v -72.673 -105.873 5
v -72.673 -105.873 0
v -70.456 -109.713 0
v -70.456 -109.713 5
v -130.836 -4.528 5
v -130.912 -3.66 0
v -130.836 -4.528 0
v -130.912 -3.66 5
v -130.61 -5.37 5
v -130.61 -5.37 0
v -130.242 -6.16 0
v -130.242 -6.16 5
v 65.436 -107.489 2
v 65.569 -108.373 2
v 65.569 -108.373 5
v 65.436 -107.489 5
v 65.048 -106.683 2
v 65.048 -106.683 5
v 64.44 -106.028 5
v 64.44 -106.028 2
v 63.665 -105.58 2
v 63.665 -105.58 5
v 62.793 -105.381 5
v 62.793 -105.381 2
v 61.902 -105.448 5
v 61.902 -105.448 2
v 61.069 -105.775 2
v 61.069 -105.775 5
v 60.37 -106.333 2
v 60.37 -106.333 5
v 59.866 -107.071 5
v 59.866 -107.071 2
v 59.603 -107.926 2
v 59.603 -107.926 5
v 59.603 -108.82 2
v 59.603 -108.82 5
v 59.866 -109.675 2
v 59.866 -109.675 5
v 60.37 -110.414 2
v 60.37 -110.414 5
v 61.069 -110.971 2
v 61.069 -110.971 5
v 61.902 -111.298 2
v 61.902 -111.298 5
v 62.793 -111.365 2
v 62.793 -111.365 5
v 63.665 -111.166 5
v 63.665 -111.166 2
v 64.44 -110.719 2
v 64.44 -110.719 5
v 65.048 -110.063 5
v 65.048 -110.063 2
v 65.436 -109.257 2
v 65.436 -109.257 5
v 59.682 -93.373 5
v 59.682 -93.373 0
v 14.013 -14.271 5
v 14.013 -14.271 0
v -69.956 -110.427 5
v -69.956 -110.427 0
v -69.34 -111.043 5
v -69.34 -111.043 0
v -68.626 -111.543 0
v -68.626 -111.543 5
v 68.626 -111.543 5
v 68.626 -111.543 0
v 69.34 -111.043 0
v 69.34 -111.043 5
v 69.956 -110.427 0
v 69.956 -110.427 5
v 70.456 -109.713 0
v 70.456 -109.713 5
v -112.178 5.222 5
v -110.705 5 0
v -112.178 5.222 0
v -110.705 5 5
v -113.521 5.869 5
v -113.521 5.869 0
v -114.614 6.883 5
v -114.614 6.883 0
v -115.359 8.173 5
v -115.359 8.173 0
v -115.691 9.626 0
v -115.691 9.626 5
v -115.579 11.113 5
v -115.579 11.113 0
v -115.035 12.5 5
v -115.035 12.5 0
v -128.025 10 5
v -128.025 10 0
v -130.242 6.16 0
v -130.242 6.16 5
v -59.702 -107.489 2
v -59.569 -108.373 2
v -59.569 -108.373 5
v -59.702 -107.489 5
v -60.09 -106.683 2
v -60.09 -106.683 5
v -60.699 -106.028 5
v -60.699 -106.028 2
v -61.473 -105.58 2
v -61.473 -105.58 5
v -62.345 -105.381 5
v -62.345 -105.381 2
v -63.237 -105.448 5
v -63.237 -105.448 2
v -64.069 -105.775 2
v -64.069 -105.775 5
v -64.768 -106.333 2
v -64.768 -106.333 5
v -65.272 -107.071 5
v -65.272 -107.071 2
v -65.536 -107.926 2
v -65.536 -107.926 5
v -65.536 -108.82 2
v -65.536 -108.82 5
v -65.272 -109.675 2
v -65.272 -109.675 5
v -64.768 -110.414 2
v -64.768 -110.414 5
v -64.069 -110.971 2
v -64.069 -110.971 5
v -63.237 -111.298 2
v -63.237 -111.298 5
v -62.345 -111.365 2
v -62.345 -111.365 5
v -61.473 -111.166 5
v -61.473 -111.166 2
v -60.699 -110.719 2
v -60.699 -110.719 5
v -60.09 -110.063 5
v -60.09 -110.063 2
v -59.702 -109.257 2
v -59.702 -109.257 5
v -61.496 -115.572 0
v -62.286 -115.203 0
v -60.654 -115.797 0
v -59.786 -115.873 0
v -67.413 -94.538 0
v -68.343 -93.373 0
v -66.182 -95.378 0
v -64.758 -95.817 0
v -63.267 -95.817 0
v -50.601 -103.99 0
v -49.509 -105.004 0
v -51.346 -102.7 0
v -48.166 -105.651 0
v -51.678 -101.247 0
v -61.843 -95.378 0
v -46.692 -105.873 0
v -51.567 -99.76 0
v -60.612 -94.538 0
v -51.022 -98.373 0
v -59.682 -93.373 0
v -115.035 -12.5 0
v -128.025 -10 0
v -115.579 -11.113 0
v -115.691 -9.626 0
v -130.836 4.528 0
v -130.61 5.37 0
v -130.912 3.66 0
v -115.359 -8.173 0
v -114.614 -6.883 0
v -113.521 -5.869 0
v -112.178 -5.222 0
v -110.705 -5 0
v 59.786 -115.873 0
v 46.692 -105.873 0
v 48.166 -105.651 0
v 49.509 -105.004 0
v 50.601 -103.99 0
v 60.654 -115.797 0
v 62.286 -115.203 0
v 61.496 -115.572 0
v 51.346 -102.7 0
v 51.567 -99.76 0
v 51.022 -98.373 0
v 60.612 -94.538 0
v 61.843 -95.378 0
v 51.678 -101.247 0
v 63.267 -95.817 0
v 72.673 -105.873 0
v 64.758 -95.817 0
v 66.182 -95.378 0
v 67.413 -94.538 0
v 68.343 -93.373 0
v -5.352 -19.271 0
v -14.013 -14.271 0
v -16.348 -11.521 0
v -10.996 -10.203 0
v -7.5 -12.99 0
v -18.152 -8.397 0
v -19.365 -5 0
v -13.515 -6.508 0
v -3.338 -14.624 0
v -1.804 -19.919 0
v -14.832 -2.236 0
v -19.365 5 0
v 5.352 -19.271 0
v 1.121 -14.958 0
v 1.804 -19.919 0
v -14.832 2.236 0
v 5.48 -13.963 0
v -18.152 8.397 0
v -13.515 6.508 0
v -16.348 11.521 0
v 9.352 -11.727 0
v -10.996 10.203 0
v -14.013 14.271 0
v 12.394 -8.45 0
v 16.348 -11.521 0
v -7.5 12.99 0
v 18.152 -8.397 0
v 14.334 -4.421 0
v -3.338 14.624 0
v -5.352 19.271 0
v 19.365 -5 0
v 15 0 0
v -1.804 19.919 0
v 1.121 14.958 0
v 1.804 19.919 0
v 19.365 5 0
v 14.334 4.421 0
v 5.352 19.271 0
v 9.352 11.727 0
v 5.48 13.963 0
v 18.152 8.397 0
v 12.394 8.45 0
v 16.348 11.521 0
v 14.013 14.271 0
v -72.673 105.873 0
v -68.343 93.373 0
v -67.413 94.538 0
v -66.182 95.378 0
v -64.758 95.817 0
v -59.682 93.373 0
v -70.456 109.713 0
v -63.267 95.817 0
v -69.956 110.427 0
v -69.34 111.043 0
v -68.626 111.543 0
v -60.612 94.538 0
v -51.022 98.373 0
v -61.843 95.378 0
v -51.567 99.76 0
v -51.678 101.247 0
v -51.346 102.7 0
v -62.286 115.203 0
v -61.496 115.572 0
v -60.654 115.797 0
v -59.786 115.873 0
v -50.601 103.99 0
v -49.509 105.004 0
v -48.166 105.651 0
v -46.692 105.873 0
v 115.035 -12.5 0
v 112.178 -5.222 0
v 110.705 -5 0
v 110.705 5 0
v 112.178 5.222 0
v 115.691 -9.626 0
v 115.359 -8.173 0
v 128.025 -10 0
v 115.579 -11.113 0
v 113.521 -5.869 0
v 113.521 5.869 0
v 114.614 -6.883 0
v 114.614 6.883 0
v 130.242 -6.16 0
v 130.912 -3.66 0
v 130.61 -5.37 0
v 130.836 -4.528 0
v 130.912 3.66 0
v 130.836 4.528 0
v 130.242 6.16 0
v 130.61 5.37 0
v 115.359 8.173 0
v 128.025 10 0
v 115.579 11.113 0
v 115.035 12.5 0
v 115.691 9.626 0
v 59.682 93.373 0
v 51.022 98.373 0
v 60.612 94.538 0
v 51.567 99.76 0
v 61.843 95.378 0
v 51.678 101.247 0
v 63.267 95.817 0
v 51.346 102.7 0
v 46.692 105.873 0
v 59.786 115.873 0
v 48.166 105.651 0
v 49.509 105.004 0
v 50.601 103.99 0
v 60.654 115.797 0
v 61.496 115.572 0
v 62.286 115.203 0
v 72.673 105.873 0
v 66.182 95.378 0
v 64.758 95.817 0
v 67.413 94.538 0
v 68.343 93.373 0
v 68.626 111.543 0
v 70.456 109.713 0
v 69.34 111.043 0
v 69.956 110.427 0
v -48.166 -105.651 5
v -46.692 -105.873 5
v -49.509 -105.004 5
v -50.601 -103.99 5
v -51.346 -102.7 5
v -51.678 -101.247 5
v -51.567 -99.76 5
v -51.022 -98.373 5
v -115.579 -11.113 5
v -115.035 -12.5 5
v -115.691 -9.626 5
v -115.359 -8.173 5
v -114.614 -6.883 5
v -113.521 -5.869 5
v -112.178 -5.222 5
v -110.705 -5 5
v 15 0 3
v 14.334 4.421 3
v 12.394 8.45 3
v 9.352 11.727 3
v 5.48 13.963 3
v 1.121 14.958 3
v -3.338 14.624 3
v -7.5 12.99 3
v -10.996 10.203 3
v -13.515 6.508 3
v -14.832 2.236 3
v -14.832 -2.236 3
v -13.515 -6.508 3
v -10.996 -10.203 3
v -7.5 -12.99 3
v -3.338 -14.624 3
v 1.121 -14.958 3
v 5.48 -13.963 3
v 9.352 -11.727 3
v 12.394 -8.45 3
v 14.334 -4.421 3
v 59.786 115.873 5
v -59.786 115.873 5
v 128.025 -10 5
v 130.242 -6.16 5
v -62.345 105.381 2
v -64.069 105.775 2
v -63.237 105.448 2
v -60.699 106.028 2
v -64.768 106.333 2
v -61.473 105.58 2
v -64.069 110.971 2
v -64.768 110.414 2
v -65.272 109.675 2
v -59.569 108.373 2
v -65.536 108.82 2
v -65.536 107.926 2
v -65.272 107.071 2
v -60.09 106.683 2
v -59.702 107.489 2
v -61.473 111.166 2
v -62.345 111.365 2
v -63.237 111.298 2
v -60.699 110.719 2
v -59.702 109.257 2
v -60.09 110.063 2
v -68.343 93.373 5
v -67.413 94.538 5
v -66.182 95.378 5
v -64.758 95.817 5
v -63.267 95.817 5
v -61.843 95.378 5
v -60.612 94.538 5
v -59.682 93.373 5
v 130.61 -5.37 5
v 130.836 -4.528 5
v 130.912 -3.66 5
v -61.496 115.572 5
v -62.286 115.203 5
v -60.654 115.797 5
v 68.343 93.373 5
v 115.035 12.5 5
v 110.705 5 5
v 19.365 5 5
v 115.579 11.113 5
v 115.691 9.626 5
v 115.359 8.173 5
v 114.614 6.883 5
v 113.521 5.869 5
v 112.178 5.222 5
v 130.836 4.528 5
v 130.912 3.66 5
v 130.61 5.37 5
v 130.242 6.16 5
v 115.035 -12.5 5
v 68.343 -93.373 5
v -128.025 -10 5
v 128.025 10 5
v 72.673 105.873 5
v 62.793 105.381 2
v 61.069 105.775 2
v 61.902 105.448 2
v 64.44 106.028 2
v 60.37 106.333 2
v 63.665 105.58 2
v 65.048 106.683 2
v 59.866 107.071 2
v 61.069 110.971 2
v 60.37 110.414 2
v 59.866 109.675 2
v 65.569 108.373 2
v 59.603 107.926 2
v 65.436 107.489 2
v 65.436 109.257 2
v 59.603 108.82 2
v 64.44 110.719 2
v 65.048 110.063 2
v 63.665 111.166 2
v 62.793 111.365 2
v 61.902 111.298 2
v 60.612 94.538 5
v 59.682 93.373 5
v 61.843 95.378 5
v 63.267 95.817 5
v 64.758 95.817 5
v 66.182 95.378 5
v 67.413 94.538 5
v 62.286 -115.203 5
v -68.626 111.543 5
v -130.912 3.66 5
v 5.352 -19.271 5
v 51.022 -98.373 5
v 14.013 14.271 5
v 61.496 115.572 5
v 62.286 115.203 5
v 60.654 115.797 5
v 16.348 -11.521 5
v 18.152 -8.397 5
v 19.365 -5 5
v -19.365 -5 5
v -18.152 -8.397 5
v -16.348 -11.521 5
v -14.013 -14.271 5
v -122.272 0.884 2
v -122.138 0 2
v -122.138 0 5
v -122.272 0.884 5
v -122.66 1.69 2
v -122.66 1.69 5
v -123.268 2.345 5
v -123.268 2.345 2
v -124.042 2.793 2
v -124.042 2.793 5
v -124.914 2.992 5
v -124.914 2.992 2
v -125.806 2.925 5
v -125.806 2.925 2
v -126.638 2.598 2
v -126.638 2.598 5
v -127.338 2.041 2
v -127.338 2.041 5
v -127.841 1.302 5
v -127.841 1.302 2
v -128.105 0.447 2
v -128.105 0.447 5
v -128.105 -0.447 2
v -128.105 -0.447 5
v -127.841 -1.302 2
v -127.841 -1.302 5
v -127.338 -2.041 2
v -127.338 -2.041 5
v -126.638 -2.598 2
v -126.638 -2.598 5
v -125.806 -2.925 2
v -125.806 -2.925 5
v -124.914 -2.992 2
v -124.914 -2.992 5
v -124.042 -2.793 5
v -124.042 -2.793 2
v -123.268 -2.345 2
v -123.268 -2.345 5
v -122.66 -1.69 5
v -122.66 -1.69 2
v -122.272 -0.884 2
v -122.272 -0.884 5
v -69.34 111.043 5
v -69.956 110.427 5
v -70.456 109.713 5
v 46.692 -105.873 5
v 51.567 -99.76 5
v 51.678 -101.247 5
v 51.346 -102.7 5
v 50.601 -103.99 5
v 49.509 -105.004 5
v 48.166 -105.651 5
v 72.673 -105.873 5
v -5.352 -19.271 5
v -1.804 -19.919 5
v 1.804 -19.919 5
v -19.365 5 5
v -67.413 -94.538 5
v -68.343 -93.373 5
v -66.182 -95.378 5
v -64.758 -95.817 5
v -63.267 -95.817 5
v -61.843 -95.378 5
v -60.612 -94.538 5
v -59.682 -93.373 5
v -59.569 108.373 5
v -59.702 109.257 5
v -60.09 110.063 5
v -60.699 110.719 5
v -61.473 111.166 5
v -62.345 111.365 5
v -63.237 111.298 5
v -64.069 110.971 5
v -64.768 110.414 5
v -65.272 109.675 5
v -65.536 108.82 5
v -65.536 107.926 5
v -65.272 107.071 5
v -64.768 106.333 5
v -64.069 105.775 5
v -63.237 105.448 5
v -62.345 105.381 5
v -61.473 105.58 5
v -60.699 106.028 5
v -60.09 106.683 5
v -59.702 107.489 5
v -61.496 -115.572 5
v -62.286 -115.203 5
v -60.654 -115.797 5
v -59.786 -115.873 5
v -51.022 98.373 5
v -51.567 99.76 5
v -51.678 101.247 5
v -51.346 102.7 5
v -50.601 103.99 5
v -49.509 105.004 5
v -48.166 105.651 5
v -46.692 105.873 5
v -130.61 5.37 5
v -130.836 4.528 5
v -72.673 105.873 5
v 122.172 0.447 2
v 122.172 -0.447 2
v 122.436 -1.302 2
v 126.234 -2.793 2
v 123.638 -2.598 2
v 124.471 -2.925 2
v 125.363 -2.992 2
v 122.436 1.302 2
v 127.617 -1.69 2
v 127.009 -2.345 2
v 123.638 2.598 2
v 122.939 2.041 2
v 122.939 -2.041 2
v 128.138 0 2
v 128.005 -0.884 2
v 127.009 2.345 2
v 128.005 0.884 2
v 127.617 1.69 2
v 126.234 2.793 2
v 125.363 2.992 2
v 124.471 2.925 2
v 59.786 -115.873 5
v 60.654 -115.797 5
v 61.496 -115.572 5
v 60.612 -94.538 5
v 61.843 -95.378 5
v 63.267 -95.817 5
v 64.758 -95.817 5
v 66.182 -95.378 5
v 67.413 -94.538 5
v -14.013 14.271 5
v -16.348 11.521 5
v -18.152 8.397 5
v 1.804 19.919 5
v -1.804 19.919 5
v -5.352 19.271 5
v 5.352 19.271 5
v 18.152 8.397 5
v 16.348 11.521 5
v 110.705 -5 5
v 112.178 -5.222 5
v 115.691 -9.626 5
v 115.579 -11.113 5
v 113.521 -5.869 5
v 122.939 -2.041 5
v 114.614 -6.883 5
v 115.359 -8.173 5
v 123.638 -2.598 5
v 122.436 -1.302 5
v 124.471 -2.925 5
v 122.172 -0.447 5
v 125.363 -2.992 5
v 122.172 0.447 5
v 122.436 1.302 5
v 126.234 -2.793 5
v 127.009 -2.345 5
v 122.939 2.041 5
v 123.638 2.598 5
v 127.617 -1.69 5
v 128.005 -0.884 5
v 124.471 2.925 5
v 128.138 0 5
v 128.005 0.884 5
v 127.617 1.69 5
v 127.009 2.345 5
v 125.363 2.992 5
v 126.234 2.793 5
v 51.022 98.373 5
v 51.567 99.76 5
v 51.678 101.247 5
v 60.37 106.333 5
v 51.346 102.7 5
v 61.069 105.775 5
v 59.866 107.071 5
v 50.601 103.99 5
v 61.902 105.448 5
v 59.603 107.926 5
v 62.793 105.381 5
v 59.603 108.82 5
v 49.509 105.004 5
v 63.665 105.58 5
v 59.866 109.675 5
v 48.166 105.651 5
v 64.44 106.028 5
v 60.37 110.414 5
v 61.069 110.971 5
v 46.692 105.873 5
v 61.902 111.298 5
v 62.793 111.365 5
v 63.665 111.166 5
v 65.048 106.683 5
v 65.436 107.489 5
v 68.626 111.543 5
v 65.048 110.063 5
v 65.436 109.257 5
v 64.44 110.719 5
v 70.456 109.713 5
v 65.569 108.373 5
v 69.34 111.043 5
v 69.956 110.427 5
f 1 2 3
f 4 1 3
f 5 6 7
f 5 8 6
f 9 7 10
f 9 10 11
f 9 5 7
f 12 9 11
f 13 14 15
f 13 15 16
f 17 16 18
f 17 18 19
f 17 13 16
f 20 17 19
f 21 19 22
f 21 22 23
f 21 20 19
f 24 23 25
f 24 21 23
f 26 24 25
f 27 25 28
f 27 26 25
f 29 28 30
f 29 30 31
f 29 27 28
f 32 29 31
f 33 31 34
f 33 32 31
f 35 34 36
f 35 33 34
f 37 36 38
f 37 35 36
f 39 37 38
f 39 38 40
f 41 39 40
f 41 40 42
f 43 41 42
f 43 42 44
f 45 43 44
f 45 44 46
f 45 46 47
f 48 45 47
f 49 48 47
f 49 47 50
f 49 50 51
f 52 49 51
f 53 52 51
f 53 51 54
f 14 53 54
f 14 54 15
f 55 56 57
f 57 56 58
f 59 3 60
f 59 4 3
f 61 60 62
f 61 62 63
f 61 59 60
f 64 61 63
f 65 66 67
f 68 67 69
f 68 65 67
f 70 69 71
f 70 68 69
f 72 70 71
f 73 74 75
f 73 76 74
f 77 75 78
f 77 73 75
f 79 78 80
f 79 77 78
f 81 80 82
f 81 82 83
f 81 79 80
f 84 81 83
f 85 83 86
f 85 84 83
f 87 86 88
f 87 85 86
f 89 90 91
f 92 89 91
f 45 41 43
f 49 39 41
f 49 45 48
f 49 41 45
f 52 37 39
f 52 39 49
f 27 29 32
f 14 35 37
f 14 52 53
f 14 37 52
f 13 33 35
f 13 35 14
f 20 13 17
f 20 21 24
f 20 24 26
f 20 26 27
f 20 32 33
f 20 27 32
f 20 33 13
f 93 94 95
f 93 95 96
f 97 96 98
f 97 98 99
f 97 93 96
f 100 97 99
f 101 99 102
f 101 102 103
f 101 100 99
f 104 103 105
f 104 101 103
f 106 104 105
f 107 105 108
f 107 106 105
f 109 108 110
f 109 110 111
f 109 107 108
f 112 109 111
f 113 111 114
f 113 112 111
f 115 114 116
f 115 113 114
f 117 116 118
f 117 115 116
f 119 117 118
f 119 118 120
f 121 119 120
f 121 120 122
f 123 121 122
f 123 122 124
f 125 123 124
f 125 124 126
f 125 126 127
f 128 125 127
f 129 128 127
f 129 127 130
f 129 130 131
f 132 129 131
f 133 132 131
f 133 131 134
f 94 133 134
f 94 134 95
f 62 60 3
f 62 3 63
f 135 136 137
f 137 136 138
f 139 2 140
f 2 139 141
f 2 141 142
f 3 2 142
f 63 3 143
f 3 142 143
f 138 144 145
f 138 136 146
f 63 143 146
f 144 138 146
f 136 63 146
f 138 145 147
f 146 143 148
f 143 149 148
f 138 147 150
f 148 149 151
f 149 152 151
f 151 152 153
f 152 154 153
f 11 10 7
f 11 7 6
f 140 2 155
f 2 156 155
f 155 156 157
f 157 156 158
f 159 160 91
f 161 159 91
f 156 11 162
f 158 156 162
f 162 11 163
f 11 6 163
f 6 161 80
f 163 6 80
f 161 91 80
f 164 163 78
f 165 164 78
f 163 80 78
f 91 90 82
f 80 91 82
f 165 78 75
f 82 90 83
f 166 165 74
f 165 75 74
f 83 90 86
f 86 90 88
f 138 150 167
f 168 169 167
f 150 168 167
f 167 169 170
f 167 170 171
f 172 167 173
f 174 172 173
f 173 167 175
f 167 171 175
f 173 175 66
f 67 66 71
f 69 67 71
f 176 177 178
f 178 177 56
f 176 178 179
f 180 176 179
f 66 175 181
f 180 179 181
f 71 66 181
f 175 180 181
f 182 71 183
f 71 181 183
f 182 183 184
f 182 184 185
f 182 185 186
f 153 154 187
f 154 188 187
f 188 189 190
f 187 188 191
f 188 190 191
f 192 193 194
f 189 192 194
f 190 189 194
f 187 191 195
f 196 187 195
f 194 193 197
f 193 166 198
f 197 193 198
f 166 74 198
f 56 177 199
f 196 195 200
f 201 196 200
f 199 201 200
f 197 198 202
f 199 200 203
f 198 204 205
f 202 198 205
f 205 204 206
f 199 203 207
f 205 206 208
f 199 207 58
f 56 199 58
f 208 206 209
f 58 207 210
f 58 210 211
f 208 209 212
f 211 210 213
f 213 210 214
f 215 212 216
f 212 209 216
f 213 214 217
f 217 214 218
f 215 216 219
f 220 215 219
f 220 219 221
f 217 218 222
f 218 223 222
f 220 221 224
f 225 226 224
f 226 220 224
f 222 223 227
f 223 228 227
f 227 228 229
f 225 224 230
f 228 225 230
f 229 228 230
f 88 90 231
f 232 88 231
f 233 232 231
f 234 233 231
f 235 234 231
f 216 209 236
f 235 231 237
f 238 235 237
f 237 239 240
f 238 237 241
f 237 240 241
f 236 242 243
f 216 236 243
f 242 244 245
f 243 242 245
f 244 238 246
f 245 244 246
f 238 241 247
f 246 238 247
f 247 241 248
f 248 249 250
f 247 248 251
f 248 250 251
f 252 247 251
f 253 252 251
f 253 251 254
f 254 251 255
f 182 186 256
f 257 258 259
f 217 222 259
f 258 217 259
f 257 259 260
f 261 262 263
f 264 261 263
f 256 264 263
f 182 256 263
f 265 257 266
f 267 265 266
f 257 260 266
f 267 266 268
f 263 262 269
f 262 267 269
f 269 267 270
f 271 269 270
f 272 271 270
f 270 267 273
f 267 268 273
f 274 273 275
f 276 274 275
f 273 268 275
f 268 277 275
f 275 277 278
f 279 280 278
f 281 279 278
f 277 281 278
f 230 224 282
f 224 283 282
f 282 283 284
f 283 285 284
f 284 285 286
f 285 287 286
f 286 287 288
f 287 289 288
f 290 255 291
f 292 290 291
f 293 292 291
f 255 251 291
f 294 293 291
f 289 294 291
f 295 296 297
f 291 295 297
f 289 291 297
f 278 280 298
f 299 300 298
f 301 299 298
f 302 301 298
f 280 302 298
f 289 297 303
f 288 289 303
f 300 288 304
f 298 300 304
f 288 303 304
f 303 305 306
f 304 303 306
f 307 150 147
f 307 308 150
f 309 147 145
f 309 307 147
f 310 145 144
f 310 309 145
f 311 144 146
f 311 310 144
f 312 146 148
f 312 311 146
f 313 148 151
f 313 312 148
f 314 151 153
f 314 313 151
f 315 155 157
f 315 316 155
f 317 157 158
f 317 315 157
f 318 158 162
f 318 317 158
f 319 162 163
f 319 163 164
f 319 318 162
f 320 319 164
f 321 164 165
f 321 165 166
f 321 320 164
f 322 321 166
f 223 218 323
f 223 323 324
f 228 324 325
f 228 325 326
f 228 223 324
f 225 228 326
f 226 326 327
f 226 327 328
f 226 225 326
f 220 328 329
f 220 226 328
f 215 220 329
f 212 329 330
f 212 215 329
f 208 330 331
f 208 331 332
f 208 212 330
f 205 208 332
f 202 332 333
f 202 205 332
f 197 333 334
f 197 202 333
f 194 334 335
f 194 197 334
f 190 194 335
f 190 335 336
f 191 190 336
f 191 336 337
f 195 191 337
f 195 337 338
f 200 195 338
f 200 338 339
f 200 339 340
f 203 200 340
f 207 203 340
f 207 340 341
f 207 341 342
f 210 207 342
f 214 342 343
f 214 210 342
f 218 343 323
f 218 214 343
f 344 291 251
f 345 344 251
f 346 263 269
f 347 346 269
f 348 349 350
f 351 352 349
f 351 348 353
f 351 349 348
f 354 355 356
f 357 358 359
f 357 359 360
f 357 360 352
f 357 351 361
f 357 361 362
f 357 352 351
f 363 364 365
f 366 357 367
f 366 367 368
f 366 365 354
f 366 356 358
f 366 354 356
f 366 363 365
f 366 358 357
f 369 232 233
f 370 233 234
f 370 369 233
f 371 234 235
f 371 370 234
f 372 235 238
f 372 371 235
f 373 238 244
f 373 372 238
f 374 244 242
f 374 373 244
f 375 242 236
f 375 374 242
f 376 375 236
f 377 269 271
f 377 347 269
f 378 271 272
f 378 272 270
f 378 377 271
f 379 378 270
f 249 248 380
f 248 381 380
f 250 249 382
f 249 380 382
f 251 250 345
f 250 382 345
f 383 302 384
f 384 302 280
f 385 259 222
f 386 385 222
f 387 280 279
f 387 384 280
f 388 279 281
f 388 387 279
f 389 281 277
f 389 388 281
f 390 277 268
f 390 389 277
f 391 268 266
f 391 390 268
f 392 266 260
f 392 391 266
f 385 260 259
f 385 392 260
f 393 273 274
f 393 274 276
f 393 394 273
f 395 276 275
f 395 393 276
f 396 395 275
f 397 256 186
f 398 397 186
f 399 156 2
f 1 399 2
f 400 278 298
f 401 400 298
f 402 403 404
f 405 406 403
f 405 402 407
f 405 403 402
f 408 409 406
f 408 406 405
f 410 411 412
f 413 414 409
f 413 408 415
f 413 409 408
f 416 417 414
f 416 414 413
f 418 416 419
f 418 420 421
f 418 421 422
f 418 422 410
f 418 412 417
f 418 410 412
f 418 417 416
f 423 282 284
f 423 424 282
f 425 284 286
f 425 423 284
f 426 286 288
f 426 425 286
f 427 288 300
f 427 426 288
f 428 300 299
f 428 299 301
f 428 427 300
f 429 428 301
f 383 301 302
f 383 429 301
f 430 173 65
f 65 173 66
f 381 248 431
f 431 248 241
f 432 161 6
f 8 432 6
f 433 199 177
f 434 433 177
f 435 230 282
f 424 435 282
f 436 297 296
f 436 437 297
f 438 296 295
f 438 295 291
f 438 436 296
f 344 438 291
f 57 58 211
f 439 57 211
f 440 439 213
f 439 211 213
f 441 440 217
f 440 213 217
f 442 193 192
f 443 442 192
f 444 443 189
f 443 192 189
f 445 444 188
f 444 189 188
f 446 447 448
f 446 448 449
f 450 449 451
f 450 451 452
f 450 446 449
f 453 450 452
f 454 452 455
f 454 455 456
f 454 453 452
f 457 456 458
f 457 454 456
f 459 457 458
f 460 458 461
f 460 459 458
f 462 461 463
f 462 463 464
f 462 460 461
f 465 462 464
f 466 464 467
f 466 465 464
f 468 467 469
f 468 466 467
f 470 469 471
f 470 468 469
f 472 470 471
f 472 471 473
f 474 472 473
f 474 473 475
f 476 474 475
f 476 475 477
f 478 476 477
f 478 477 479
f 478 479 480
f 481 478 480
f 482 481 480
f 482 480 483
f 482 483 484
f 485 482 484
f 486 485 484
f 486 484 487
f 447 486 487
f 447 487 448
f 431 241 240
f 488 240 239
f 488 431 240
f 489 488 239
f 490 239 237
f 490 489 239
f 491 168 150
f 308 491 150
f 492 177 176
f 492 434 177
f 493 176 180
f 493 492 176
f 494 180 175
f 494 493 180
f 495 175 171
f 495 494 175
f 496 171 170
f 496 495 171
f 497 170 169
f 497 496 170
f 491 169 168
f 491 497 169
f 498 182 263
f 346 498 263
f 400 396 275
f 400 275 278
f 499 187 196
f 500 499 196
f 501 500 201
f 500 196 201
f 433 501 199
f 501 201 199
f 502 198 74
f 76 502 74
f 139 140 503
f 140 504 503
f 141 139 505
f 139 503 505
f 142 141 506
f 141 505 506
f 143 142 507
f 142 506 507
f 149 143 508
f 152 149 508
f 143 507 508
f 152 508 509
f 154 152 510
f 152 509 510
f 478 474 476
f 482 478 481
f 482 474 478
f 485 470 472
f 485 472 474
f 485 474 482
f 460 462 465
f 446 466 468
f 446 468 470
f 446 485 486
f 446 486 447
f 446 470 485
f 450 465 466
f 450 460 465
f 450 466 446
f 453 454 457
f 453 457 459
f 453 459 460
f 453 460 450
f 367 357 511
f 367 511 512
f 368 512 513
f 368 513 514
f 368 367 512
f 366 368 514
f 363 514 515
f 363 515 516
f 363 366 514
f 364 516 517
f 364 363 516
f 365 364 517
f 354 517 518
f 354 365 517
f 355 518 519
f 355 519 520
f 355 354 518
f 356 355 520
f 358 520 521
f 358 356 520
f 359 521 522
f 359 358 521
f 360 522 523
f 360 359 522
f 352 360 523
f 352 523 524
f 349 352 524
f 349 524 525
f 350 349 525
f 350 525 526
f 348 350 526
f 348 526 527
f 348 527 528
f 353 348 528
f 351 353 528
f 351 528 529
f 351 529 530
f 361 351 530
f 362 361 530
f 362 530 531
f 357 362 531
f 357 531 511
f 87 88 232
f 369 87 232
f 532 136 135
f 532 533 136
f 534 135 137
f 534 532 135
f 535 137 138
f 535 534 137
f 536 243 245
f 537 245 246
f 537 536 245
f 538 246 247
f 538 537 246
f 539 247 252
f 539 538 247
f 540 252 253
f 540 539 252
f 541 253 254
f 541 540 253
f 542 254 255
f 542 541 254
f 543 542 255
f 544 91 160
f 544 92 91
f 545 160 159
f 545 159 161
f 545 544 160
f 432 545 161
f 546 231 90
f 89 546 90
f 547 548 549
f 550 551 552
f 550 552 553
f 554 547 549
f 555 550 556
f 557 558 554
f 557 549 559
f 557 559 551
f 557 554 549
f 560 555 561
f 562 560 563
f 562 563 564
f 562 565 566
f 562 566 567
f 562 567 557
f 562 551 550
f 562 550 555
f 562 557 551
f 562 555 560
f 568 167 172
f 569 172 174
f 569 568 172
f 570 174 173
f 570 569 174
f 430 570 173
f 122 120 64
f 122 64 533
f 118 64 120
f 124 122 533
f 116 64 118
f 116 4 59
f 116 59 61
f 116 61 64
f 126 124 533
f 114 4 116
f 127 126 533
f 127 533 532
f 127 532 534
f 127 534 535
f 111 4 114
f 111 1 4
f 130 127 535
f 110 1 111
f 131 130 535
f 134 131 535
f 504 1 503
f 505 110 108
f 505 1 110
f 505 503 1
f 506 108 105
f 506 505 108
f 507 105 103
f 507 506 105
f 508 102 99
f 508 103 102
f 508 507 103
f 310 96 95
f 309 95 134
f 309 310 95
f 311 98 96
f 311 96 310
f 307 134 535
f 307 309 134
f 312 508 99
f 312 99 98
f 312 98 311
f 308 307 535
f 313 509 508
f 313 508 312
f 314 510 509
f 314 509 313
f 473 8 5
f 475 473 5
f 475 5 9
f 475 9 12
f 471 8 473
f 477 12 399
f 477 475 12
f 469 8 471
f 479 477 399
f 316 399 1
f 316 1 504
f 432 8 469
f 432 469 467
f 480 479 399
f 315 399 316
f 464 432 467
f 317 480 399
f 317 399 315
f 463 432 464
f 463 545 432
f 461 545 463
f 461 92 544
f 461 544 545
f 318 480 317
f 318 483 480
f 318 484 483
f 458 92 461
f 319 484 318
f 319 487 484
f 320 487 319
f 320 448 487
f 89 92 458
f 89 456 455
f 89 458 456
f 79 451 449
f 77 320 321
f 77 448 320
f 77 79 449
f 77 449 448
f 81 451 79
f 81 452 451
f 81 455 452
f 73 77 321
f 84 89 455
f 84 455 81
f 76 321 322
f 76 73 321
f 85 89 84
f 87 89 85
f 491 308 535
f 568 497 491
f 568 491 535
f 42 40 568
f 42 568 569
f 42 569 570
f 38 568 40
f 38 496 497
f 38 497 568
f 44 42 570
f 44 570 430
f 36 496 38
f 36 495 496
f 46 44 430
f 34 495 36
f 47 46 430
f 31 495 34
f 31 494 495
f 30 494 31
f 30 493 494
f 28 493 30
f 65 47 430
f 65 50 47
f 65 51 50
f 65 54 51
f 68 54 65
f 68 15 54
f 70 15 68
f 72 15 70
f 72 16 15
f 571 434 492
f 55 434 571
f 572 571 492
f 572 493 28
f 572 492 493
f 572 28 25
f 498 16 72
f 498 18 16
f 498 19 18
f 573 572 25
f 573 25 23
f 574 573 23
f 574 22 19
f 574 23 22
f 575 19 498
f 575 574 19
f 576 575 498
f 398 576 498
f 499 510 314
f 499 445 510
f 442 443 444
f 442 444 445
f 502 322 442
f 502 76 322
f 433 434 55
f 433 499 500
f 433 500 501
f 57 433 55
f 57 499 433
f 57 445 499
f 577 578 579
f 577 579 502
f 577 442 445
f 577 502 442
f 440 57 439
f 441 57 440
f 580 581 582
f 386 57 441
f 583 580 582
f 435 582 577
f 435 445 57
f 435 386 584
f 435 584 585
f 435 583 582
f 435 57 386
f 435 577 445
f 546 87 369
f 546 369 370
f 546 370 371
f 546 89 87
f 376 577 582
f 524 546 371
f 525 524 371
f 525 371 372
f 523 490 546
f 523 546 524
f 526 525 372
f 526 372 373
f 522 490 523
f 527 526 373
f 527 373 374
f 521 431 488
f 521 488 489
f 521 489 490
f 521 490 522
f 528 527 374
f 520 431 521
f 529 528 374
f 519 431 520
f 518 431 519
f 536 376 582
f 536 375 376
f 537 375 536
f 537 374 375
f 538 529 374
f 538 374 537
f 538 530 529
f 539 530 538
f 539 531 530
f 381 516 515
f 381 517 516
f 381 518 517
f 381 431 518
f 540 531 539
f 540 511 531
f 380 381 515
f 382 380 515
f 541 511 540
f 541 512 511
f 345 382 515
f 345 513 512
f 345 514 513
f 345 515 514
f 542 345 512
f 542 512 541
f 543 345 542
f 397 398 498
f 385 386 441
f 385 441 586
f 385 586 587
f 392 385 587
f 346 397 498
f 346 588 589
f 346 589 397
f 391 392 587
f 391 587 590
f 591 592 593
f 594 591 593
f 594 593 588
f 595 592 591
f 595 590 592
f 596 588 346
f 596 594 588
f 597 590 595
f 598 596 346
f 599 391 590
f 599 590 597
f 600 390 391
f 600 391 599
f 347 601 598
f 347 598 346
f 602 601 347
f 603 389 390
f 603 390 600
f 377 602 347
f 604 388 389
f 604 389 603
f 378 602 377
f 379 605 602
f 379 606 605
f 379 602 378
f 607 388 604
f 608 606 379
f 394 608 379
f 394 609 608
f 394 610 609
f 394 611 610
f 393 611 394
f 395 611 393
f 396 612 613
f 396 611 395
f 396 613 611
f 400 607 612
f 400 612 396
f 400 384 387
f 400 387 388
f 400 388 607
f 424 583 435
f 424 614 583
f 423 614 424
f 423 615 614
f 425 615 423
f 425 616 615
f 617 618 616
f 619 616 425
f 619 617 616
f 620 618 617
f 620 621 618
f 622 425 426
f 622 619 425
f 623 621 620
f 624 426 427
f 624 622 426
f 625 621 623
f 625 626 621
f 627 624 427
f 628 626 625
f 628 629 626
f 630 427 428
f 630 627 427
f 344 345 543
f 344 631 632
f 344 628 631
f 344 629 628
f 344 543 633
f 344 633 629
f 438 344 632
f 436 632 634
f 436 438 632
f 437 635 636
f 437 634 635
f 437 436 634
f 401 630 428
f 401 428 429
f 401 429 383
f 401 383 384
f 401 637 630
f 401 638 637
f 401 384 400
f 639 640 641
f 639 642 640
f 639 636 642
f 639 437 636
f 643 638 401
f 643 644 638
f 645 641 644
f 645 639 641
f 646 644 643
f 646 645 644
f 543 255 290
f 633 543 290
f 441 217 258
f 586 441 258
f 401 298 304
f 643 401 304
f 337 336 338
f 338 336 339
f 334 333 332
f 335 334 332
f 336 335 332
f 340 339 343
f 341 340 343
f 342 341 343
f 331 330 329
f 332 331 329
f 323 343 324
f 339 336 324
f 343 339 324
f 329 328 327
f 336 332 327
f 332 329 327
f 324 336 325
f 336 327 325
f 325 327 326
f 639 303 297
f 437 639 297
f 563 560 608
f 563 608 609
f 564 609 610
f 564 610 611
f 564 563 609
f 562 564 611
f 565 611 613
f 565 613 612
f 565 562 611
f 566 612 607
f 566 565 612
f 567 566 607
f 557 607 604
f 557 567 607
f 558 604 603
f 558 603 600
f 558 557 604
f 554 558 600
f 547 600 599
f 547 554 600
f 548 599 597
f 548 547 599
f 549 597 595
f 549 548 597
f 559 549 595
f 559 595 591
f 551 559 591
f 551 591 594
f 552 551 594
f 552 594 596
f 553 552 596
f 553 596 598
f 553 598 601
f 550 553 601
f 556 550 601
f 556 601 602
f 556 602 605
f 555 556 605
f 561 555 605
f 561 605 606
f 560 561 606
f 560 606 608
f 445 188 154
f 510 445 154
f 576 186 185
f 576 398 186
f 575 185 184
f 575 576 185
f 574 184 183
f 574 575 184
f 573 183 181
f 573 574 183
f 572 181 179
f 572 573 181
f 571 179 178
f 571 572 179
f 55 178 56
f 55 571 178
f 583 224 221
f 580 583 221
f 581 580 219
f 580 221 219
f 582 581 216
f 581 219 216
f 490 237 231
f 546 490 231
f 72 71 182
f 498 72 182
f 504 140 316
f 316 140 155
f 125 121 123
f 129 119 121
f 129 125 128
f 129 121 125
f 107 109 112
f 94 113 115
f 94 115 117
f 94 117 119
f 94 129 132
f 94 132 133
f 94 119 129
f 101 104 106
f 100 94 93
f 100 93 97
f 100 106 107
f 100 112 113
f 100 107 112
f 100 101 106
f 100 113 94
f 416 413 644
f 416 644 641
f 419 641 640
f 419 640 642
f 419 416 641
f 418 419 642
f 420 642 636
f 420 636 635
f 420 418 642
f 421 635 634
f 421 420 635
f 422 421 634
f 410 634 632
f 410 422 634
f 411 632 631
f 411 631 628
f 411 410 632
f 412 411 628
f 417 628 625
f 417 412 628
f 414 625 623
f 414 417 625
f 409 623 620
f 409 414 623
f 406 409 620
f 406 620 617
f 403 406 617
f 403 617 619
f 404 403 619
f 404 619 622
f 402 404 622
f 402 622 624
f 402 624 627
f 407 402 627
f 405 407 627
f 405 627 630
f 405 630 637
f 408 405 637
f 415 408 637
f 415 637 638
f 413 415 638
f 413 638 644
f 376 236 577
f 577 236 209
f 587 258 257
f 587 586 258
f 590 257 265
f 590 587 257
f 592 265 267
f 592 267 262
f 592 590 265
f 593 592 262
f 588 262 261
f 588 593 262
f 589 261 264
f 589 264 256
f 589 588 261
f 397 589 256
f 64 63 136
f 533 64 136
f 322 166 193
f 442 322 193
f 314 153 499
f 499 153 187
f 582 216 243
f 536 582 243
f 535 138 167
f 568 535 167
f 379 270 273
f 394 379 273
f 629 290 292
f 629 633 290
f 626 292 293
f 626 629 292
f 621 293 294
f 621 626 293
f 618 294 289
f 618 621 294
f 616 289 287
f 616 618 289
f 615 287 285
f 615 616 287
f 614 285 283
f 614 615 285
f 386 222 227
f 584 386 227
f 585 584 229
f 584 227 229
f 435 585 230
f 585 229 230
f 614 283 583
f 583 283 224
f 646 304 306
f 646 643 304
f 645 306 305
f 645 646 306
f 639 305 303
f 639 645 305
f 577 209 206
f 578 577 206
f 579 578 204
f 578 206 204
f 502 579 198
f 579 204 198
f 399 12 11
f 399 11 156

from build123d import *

# Parameters (mm, degrees)
F0_R     = 3
F1_DEPTH = 5
F2_DEPTH = 2
F3_R     = 5
F4_R     = 5
F0_R_2   = 15
F5_DEPTH = 5
F6_DEPTH = 5
F7_DEPTH = 3


# Not quite as in the source:
# - a feature names something its author has since deleted; it is built from what else it names


with BuildPart() as f1:
    # F0 (on Top) → F1 (new body)
    with BuildSketch(Plane.XY):
        Polygon((55.3523313466, 115.8730502097), (-55.3523313466, 115.8730502097), (-61.1258340385, 115.8730502097), (-69.7860880763, 110.8730502097), (-72.6728394223, 105.8730502097), (-128.0251707689, 10), (-130.9119221148, 5), (-130.9119221148, -5), (-128.0251707689, -10), (-72.6728394223, -105.8730502097), (-69.7860880763, -110.8730502097), (-61.1258340385, -115.8730502097), (-55.3523313466, -115.8730502097), (55.3523313466, -115.8730502097), (61.1258340385, -115.8730502097), (69.7860880763, -110.8730502097), (72.6728394223, -105.8730502097), (128.0251707689, -10), (130.9119221148, -5), (130.9119221148, 5), (128.0251707689, 10), (72.6728394223, 105.8730502097), (69.7860880763, 110.8730502097), (61.1258340385, 115.8730502097), align=None)
        with Locations((-62.5692097115, -108.3730502097)):
            Circle(F0_R, mode=Mode.SUBTRACT)
        with Locations((62.5692097115, -108.3730502097)):
            Circle(F0_R, mode=Mode.SUBTRACT)
        with Locations((-125.1384194229, 0)):
            Circle(F0_R, mode=Mode.SUBTRACT)
        Polygon((-119.364916731, -5), (-119.364916731, 0), (-119.364916731, 5), (-64.0125853844, 100.8730502097), (-59.6824583655, 103.3730502097), (-55.3523313466, 105.8730502097), (55.3523313466, 105.8730502097), (59.6824583655, 103.3730502097), (64.0125853844, 100.8730502097), (119.364916731, 5), (119.364916731, 0), (119.364916731, -5), (64.0125853844, -100.8730502097), (59.6824583655, -103.3730502097), (55.3523313466, -105.8730502097), (-55.3523313466, -105.8730502097), (-59.6824583655, -103.3730502097), (-64.0125853844, -100.8730502097), align=None, mode=Mode.SUBTRACT)
        with Locations((-62.5692097115, 108.3730502097)):
            Circle(F0_R, mode=Mode.SUBTRACT)
        with Locations((125.1384194229, 0)):
            Circle(F0_R, mode=Mode.SUBTRACT)
        with Locations((62.5692097115, 108.3730502097)):
            Circle(F0_R, mode=Mode.SUBTRACT)
        with BuildLine():
            Line((-59.6824583655, 103.3730502097), (-64.0125853844, 100.8730502097))
            Line((-64.0125853844, 100.8730502097), (-14.0125853844, 14.2705098312))
            ThreePointArc((-14.0125853844, 14.2705098312), (-10, 17.3205080757), (-5.3523313466, 19.2705098312))
            Line((-5.3523313466, 19.2705098312), (-55.3523313466, 105.8730502097))
            Line((-55.3523313466, 105.8730502097), (-59.6824583655, 103.3730502097))
        make_face()
        with BuildLine():
            Line((55.3523313466, 105.8730502097), (5.3523313466, 19.2705098312))
            ThreePointArc((5.3523313466, 19.2705098312), (10, 17.3205080757), (14.0125853844, 14.2705098312))
            Line((14.0125853844, 14.2705098312), (64.0125853844, 100.8730502097))
            Line((64.0125853844, 100.8730502097), (59.6824583655, 103.3730502097))
            Line((59.6824583655, 103.3730502097), (55.3523313466, 105.8730502097))
        make_face()
        with BuildLine():
            Line((119.364916731, 5), (19.364916731, 5))
            ThreePointArc((19.364916731, 5), (19.8405939253, 2.5200858497), (20, 0))
            ThreePointArc((20, 0), (19.8405939253, -2.5200858497), (19.364916731, -5))
            Line((19.364916731, -5), (119.364916731, -5))
            Line((119.364916731, -5), (119.364916731, 0))
            Line((119.364916731, 0), (119.364916731, 5))
        make_face()
        with BuildLine():
            ThreePointArc((14.0125853844, -14.2705098312), (10, -17.3205080757), (5.3523313466, -19.2705098312))
            Line((5.3523313466, -19.2705098312), (55.3523313466, -105.8730502097))
            Line((55.3523313466, -105.8730502097), (59.6824583655, -103.3730502097))
            Line((59.6824583655, -103.3730502097), (64.0125853844, -100.8730502097))
            Line((64.0125853844, -100.8730502097), (14.0125853844, -14.2705098312))
        make_face()
        with BuildLine():
            Line((-14.0125853844, -14.2705098312), (-64.0125853844, -100.8730502097))
            Line((-64.0125853844, -100.8730502097), (-59.6824583655, -103.3730502097))
            Line((-59.6824583655, -103.3730502097), (-55.3523313466, -105.8730502097))
            Line((-55.3523313466, -105.8730502097), (-5.3523313466, -19.2705098312))
            ThreePointArc((-5.3523313466, -19.2705098312), (-10, -17.3205080757), (-14.0125853844, -14.2705098312))
        make_face()
        with BuildLine():
            Line((-119.364916731, 5), (-119.364916731, 0))
            Line((-119.364916731, 0), (-119.364916731, -5))
            Line((-119.364916731, -5), (-19.364916731, -5))
            ThreePointArc((-19.364916731, -5), (-20, 0), (-19.364916731, 5))
            Line((-19.364916731, 5), (-119.364916731, 5))
        make_face()
    extrude(amount=F1_DEPTH)

    # F0 (on Top) → F2 (join)
    with BuildSketch(Plane.XY):
        with Locations((-125.1384194229, 0)):
            Circle(F0_R)
        with Locations((-62.5692097115, 108.3730502097)):
            Circle(F0_R)
        with Locations((62.5692097115, 108.3730502097)):
            Circle(F0_R)
        with Locations((125.1384194229, 0)):
            Circle(F0_R)
        with Locations((62.5692097115, -108.3730502097)):
            Circle(F0_R)
        with Locations((-62.5692097115, -108.3730502097)):
            Circle(F0_R)
    extrude(amount=F2_DEPTH)

    # F3
    f3_edges = [f1.edges().sort_by_distance(p)[0] for p in [
        (-130.911922, 5, 2.5),
        (-130.911922, -5, 2.5),
        (-69.786088, -110.87305, 2.5),
        (-61.125834, -115.87305, 2.5),
        (61.125834, -115.87305, 2.5),
        (69.786088, -110.87305, 2.5),
        (130.911922, -5, 2.5),
        (130.911922, 5, 2.5),
        (69.786088, 110.87305, 2.5),
        (61.125834, 115.87305, 2.5),
        (-61.125834, 115.87305, 2.5),
        (-69.786088, 110.87305, 2.5),
    ]]
    fillet(f3_edges, radius=F3_R)

    # F4
    f4_edges = [f1.edges().sort_by_distance(p)[0] for p in [
        (-64.012585, 100.87305, 2.5),
        (-55.352331, 105.87305, 2.5),
        (55.352331, 105.87305, 2.5),
        (64.012585, 100.87305, 2.5),
        (119.364917, 5, 2.5),
        (119.364917, -5, 2.5),
        (64.012585, -100.87305, 2.5),
        (55.352331, -105.87305, 2.5),
        (-55.352331, -105.87305, 2.5),
        (-64.012585, -100.87305, 2.5),
        (-119.364917, -5, 2.5),
        (-119.364917, 5, 2.5),
    ]]
    fillet(f4_edges, radius=F4_R)

    # F0 (on Top) → F5 (join)
    with BuildSketch(Plane.XY):
        with BuildLine():
            ThreePointArc((-14.0125853844, 14.2705098312), (-17.3205080757, 10), (-19.364916731, 5))
            ThreePointArc((-19.364916731, 5), (-20, 0), (-19.364916731, -5))
            ThreePointArc((-19.364916731, -5), (-17.3205080757, -10), (-14.0125853844, -14.2705098312))
            ThreePointArc((-14.0125853844, -14.2705098312), (-10, -17.3205080757), (-5.3523313466, -19.2705098312))
            ThreePointArc((-5.3523313466, -19.2705098312), (0, -20), (5.3523313466, -19.2705098312))
            ThreePointArc((5.3523313466, -19.2705098312), (10, -17.3205080757), (14.0125853844, -14.2705098312))
            ThreePointArc((14.0125853844, -14.2705098312), (17.3205080757, -10), (19.364916731, -5))
            ThreePointArc((19.364916731, -5), (19.8405939253, -2.5200858497), (20, 0))
            ThreePointArc((20, 0), (19.8405939253, 2.5200858497), (19.364916731, 5))
            ThreePointArc((19.364916731, 5), (17.3205080757, 10), (14.0125853844, 14.2705098312))
            ThreePointArc((14.0125853844, 14.2705098312), (10, 17.3205080757), (5.3523313466, 19.2705098312))
            ThreePointArc((5.3523313466, 19.2705098312), (0, 20), (-5.3523313466, 19.2705098312))
            ThreePointArc((-5.3523313466, 19.2705098312), (-10, 17.3205080757), (-14.0125853844, 14.2705098312))
        make_face()
        Circle(F0_R_2, mode=Mode.SUBTRACT)
    extrude(amount=F5_DEPTH)

    # F0 (on Top) → F6 (join)
    with BuildSketch(Plane.XY):
        Circle(F0_R_2)
    extrude(amount=F6_DEPTH)

    # F0 (on Top) → F7 (cut)
    with BuildSketch(Plane.XY):
        Circle(F0_R_2)
    extrude(amount=F7_DEPTH, mode=Mode.SUBTRACT)


solid = f1.part
